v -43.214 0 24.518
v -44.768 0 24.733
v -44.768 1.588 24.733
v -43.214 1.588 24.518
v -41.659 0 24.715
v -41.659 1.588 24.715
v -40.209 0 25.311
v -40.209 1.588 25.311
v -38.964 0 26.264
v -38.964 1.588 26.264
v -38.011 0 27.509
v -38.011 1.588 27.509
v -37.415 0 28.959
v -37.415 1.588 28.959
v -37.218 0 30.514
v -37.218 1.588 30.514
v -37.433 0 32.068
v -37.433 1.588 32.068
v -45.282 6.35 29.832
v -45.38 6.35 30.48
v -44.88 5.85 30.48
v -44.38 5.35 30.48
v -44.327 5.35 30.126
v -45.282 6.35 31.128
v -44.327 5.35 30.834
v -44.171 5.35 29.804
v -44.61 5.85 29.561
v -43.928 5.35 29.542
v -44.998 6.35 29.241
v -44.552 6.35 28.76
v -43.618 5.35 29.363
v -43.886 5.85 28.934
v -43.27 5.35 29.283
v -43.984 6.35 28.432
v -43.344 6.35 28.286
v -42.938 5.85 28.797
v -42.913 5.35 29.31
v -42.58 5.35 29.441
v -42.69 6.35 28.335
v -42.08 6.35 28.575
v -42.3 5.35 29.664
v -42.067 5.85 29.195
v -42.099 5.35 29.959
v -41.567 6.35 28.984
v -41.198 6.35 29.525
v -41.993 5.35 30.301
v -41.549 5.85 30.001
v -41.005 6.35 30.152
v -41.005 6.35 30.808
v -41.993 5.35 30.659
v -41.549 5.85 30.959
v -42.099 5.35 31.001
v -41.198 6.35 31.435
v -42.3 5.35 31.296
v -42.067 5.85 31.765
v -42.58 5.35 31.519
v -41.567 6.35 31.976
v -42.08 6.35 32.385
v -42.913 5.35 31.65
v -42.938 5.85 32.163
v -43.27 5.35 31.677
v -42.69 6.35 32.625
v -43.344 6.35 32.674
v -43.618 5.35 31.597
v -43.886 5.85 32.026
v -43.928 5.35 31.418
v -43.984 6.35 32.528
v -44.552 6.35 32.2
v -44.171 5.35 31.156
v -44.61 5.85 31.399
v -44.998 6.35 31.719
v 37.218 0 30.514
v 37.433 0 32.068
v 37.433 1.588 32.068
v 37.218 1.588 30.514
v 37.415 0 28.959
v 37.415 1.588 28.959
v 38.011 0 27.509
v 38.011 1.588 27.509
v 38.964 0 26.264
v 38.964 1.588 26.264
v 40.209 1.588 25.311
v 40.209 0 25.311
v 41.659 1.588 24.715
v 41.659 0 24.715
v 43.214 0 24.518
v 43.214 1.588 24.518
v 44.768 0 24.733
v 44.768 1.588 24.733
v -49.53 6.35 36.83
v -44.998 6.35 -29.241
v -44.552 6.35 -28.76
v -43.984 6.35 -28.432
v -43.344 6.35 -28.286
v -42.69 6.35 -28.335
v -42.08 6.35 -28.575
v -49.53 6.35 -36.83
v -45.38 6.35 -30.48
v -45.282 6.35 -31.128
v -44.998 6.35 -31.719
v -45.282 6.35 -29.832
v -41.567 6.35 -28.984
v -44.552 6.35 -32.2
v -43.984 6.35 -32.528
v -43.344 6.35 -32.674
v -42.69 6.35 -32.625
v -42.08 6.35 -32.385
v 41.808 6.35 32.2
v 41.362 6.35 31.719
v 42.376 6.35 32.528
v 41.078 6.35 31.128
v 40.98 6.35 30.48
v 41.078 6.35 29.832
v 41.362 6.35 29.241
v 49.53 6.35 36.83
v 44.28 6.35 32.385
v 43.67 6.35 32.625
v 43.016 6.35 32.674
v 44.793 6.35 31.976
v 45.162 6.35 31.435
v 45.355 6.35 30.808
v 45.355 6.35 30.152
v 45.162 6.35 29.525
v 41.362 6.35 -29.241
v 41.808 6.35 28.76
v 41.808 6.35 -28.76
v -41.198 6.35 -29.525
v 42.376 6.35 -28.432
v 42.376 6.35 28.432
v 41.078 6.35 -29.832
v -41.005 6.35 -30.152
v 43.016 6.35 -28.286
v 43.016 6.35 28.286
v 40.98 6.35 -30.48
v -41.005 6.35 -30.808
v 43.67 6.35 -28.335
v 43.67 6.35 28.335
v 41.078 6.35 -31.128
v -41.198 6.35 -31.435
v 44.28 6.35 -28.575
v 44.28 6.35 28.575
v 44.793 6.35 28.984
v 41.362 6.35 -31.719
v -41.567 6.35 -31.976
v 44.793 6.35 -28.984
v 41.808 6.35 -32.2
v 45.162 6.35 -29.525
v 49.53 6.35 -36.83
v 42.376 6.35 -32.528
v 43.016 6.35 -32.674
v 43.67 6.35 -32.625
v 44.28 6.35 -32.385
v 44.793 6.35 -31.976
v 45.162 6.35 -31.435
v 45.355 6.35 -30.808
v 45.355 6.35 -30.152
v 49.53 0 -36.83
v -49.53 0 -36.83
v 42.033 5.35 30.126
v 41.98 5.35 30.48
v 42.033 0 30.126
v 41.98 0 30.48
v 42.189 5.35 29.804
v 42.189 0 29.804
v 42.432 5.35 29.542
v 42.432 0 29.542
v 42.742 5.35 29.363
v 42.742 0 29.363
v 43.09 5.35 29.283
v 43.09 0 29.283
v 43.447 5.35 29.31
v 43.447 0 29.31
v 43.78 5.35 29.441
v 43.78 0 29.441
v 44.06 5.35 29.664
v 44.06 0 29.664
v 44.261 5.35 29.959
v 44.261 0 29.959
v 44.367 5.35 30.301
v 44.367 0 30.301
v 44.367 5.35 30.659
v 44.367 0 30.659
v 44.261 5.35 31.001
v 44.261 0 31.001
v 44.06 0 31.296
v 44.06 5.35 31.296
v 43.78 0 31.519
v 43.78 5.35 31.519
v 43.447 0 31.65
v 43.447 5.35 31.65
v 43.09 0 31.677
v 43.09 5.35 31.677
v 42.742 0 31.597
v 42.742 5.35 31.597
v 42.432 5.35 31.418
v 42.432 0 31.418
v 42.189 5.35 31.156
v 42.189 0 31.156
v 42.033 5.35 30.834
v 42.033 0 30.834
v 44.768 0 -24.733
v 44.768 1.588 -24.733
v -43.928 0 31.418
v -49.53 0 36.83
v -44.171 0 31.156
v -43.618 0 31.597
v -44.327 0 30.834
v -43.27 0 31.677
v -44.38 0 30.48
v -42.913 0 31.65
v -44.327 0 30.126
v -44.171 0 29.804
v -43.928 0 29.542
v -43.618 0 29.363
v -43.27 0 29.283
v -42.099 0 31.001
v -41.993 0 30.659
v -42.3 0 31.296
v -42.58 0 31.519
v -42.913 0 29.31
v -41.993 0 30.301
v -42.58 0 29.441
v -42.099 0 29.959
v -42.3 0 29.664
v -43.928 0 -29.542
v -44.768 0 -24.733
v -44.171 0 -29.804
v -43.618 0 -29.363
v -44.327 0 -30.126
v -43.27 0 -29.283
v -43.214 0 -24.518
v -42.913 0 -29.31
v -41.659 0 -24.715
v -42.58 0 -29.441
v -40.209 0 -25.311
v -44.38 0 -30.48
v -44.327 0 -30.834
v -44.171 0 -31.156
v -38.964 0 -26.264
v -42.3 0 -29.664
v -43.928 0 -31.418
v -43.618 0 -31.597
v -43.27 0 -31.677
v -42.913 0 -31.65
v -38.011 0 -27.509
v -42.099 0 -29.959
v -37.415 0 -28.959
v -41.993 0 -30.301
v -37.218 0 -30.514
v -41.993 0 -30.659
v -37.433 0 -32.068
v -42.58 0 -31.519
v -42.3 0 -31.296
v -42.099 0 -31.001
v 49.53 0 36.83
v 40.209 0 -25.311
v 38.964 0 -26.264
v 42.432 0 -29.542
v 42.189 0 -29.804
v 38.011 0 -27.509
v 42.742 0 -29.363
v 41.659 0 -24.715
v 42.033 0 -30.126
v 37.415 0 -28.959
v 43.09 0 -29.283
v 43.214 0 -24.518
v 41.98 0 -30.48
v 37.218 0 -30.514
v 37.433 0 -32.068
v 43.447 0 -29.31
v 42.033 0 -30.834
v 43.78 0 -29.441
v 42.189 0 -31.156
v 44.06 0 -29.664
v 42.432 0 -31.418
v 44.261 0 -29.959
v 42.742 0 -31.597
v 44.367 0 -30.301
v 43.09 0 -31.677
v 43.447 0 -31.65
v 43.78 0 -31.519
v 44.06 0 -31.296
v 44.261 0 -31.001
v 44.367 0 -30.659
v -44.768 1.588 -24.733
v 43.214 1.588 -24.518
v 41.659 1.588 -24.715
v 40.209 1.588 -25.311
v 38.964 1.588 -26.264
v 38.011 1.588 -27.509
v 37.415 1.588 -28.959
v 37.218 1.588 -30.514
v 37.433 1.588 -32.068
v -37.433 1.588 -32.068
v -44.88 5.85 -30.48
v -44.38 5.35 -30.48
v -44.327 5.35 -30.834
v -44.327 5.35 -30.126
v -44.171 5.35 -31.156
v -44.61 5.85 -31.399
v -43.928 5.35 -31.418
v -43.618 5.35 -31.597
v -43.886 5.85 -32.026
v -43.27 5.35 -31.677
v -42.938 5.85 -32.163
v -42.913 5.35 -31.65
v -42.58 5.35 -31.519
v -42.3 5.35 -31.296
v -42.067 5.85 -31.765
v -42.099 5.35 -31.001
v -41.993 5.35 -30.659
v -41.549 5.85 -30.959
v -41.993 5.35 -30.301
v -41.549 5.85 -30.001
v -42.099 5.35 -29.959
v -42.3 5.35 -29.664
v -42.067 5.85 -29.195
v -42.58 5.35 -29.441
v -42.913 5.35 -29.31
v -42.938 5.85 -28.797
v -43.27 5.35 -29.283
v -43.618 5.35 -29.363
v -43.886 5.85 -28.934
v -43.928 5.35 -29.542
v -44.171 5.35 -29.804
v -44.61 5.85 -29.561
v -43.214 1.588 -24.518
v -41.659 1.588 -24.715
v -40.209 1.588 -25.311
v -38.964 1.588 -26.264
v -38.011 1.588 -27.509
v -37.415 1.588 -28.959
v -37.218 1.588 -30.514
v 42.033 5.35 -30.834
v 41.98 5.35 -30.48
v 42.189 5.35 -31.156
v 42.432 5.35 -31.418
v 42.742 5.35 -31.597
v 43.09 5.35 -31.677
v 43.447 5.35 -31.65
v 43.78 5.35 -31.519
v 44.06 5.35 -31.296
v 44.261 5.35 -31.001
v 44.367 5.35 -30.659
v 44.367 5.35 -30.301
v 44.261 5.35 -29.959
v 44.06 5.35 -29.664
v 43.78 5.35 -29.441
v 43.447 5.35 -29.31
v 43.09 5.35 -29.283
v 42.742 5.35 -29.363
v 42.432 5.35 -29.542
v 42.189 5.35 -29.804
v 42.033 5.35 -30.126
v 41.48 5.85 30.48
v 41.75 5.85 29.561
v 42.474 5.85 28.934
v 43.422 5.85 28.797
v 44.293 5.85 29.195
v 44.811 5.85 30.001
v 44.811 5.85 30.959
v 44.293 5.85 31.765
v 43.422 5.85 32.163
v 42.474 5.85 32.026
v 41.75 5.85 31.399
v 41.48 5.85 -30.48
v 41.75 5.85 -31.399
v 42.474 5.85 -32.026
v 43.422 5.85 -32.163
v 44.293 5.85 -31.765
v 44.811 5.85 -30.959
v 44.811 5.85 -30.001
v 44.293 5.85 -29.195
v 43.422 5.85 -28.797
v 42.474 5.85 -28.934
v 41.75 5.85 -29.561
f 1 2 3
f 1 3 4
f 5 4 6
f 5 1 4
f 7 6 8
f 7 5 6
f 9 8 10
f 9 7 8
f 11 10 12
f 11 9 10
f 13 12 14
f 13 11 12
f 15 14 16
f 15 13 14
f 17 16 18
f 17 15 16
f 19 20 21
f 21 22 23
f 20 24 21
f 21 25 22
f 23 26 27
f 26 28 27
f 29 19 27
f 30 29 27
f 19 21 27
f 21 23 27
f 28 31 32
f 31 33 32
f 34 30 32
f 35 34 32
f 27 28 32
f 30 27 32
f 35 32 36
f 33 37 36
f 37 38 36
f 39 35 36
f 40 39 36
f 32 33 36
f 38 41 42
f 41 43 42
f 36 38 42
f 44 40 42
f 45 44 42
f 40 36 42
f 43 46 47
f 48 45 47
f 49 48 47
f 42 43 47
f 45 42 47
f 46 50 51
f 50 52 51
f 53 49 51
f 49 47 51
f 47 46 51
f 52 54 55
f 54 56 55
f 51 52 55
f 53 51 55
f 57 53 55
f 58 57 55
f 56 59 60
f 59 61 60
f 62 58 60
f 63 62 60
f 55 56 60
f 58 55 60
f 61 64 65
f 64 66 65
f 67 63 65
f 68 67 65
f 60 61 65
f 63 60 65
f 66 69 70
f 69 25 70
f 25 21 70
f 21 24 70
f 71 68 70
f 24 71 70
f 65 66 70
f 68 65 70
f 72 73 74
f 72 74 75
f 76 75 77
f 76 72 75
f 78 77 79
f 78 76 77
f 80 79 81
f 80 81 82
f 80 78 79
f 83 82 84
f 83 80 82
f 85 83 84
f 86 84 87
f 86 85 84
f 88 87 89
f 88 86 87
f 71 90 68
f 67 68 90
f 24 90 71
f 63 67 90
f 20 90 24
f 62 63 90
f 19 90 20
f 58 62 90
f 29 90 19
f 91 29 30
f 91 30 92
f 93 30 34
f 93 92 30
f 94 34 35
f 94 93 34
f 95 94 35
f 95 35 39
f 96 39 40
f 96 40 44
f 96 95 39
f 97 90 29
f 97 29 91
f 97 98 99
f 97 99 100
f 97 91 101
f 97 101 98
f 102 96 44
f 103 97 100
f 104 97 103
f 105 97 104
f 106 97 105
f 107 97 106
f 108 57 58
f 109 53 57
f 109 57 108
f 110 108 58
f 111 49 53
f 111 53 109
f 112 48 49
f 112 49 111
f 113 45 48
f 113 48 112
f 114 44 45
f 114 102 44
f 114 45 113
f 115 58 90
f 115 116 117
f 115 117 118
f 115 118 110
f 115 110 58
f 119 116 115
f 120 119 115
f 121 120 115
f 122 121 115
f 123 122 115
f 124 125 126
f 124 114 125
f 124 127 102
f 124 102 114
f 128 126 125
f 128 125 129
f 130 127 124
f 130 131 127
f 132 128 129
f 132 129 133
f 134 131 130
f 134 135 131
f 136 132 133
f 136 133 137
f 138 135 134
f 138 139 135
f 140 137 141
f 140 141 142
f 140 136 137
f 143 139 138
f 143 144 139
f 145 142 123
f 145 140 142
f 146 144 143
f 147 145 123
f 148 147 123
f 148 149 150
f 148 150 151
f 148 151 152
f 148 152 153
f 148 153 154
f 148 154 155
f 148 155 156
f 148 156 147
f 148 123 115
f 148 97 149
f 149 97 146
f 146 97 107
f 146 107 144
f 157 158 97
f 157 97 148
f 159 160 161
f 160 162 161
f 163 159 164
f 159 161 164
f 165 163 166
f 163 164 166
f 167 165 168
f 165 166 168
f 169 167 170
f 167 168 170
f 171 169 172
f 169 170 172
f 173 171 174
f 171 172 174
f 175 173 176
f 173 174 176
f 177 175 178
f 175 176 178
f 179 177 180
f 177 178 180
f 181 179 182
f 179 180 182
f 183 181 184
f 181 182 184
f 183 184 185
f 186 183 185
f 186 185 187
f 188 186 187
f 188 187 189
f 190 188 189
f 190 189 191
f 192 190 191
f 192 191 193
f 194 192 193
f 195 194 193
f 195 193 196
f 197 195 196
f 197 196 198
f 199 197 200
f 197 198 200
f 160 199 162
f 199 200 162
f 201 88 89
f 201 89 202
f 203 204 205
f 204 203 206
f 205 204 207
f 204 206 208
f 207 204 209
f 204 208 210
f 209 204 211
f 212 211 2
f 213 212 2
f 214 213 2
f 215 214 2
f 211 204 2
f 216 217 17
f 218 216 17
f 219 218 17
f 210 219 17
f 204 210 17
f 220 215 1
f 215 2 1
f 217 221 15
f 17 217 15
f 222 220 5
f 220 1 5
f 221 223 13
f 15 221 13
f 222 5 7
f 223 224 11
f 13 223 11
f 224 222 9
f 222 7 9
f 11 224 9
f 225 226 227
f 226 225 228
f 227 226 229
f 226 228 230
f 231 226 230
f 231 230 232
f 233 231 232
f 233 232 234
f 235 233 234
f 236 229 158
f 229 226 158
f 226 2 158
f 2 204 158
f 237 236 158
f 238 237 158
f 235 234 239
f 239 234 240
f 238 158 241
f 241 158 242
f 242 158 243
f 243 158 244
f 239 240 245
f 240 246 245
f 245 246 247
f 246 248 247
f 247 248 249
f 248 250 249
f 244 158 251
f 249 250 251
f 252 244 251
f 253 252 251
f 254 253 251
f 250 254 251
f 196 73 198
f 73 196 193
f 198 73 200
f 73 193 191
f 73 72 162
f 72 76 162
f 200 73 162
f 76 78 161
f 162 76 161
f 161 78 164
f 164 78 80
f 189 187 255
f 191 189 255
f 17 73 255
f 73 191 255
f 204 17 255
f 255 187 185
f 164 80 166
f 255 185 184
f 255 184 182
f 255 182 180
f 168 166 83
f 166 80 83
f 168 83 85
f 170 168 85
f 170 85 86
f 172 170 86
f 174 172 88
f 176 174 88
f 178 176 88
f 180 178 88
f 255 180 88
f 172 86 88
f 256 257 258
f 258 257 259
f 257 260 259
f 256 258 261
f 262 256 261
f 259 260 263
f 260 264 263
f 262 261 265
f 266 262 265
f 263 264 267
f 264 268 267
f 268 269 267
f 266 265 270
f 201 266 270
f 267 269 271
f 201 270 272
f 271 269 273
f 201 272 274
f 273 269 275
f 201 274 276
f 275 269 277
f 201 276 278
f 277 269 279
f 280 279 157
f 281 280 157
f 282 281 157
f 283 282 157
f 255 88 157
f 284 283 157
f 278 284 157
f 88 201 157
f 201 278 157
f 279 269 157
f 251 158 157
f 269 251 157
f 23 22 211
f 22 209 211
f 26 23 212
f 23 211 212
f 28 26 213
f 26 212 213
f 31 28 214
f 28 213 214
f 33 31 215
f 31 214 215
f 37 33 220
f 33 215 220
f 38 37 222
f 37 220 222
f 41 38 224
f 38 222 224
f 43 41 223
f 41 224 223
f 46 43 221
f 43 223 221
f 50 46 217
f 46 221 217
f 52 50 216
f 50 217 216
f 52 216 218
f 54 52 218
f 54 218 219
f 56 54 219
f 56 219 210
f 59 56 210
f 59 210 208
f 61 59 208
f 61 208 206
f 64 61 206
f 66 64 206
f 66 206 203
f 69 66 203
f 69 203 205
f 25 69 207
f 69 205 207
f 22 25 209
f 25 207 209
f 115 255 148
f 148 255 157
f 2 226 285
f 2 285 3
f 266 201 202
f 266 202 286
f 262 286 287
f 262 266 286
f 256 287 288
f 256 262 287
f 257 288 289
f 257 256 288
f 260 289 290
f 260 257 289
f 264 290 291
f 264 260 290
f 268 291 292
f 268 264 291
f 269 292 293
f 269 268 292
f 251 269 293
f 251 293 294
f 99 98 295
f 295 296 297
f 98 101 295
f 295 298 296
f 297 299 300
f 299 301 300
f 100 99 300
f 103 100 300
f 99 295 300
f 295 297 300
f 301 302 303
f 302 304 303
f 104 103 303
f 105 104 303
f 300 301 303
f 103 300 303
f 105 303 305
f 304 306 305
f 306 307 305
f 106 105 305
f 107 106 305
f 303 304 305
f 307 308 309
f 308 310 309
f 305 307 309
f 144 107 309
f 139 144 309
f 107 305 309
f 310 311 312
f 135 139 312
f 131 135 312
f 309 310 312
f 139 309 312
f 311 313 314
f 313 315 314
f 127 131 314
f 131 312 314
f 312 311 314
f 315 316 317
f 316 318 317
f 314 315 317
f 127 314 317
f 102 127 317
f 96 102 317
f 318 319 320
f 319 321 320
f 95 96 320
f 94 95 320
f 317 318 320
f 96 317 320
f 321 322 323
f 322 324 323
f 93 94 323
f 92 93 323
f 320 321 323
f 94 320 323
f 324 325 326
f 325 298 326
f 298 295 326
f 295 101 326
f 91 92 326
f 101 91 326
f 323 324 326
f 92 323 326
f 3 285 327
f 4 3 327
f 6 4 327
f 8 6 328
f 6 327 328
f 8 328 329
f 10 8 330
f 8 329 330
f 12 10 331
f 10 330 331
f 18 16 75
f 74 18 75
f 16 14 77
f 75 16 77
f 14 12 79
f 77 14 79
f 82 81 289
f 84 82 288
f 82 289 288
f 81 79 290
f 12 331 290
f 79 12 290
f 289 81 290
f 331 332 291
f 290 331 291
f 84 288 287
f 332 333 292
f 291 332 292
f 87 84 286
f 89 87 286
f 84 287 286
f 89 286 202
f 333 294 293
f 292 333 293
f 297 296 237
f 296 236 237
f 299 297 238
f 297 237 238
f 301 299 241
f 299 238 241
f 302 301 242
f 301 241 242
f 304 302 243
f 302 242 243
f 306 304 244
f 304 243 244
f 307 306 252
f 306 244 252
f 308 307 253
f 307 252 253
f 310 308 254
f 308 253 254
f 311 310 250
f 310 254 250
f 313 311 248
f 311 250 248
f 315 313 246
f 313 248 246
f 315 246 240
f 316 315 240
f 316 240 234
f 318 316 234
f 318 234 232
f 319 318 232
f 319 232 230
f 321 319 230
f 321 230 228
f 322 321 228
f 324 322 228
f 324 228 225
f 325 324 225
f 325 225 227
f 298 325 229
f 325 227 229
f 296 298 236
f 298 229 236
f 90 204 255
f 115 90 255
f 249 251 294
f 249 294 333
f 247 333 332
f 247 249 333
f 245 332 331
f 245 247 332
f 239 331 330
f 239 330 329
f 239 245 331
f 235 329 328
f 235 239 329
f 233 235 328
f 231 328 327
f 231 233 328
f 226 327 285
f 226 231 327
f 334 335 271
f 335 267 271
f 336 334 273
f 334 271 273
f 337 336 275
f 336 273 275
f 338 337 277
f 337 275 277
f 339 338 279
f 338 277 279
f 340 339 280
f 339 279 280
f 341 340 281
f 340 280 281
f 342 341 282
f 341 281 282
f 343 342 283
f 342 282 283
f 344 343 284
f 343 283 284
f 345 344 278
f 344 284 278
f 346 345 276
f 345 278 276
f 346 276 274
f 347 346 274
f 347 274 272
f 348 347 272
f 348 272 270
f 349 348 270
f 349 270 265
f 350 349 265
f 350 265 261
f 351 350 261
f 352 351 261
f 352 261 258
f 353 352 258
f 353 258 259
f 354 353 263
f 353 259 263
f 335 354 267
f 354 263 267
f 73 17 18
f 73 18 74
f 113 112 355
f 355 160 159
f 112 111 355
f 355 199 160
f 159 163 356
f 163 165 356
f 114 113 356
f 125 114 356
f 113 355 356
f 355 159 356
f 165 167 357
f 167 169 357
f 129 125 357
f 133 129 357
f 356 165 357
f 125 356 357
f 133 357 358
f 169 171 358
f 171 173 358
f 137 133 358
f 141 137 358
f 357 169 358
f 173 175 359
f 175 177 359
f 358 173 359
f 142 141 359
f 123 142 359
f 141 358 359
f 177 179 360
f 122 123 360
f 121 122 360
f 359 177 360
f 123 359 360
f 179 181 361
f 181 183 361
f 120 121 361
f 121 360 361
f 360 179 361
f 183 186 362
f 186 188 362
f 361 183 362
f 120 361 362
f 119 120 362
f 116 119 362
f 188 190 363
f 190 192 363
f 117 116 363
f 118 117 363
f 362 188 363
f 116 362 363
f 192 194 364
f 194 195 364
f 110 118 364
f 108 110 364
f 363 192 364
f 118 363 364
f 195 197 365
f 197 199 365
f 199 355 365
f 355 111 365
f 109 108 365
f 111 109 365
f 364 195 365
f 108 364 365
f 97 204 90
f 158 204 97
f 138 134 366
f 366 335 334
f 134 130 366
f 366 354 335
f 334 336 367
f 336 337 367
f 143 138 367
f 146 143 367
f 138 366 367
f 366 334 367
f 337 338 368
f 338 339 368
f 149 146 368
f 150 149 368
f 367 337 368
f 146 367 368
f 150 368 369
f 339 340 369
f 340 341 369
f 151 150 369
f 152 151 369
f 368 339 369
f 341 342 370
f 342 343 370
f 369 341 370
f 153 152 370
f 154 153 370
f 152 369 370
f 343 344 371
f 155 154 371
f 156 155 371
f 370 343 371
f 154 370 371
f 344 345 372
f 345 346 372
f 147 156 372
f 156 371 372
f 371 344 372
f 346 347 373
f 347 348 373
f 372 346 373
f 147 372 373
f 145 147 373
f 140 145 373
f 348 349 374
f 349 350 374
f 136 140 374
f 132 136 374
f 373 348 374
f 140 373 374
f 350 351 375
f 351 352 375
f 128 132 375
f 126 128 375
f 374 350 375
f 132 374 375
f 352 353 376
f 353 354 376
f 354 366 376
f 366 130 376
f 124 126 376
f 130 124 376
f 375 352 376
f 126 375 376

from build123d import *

# Parameters (mm, degrees)
SKETCH1_W                                       = 99.06
SKETCH1_H                                       = 73.66
BOSS_EXTRUDE1_DEPTH                             = 6.35
CSK_FOR_M2_FLAT_HEAD_MACHINE_SCREW1_D           = 2.4
CSK_FOR_M2_FLAT_HEAD_MACHINE_SCREW1_CSINK_D     = 4.4
CSK_FOR_M2_FLAT_HEAD_MACHINE_SCREW1_CSINK_ANGLE = 90
SHELL1_DEPTH                                    = 1.5875


# Read off the part's stored shape, not the designer's step: Shell1
with BuildPart() as part:
    # Sketch1 → Boss-Extrude1 (new body)
    with BuildSketch(Plane(origin=(0, 0, 0), x_dir=(1, 0, 0), z_dir=(0, 1, 0))):
        Rectangle(SKETCH1_W, SKETCH1_H)
    extrude(amount=BOSS_EXTRUDE1_DEPTH)

    # CSK for M2 Flat Head Machine Screw1 (through all)
    with Locations(Plane(origin=(0, 6.35, 0), x_dir=(1, 0, 0), z_dir=(0, 1, 0))):
        with Locations((-43.18, 30.48), (-43.18, -30.48), (43.18, -30.48), (43.18, 30.48)):
            CounterSinkHole(CSK_FOR_M2_FLAT_HEAD_MACHINE_SCREW1_D / 2, CSK_FOR_M2_FLAT_HEAD_MACHINE_SCREW1_CSINK_D / 2, counter_sink_angle=CSK_FOR_M2_FLAT_HEAD_MACHINE_SCREW1_CSINK_ANGLE)

    # Shell1 outline → Shell1 (cut)
    with BuildSketch(Plane(origin=(0, 0, 0), x_dir=(1, 0, 0), z_dir=(0, 1, 0))):
        with BuildLine():
            Line((44.7675, -24.732718034), (44.7675, 24.732718034))
            ThreePointArc((44.7675, 24.732718034), (38.963875817, 26.263875817), (37.432718034, 32.0675))
            Line((37.432718034, 32.0675), (-37.432718034, 32.0675))
            ThreePointArc((-37.432718034, 32.0675), (-38.963875817, 26.263875817), (-44.7675, 24.732718034))
            Line((-44.7675, 24.732718034), (-44.7675, -24.732718034))
            ThreePointArc((-44.7675, -24.732718034), (-38.963875817, -26.263875817), (-37.432718034, -32.0675))
            Line((-37.432718034, -32.0675), (37.432718034, -32.0675))
            ThreePointArc((37.432718034, -32.0675), (38.963875817, -26.263875817), (44.7675, -24.732718034))
        make_face()
    extrude(amount=SHELL1_DEPTH, mode=Mode.SUBTRACT)


solid = part.part
